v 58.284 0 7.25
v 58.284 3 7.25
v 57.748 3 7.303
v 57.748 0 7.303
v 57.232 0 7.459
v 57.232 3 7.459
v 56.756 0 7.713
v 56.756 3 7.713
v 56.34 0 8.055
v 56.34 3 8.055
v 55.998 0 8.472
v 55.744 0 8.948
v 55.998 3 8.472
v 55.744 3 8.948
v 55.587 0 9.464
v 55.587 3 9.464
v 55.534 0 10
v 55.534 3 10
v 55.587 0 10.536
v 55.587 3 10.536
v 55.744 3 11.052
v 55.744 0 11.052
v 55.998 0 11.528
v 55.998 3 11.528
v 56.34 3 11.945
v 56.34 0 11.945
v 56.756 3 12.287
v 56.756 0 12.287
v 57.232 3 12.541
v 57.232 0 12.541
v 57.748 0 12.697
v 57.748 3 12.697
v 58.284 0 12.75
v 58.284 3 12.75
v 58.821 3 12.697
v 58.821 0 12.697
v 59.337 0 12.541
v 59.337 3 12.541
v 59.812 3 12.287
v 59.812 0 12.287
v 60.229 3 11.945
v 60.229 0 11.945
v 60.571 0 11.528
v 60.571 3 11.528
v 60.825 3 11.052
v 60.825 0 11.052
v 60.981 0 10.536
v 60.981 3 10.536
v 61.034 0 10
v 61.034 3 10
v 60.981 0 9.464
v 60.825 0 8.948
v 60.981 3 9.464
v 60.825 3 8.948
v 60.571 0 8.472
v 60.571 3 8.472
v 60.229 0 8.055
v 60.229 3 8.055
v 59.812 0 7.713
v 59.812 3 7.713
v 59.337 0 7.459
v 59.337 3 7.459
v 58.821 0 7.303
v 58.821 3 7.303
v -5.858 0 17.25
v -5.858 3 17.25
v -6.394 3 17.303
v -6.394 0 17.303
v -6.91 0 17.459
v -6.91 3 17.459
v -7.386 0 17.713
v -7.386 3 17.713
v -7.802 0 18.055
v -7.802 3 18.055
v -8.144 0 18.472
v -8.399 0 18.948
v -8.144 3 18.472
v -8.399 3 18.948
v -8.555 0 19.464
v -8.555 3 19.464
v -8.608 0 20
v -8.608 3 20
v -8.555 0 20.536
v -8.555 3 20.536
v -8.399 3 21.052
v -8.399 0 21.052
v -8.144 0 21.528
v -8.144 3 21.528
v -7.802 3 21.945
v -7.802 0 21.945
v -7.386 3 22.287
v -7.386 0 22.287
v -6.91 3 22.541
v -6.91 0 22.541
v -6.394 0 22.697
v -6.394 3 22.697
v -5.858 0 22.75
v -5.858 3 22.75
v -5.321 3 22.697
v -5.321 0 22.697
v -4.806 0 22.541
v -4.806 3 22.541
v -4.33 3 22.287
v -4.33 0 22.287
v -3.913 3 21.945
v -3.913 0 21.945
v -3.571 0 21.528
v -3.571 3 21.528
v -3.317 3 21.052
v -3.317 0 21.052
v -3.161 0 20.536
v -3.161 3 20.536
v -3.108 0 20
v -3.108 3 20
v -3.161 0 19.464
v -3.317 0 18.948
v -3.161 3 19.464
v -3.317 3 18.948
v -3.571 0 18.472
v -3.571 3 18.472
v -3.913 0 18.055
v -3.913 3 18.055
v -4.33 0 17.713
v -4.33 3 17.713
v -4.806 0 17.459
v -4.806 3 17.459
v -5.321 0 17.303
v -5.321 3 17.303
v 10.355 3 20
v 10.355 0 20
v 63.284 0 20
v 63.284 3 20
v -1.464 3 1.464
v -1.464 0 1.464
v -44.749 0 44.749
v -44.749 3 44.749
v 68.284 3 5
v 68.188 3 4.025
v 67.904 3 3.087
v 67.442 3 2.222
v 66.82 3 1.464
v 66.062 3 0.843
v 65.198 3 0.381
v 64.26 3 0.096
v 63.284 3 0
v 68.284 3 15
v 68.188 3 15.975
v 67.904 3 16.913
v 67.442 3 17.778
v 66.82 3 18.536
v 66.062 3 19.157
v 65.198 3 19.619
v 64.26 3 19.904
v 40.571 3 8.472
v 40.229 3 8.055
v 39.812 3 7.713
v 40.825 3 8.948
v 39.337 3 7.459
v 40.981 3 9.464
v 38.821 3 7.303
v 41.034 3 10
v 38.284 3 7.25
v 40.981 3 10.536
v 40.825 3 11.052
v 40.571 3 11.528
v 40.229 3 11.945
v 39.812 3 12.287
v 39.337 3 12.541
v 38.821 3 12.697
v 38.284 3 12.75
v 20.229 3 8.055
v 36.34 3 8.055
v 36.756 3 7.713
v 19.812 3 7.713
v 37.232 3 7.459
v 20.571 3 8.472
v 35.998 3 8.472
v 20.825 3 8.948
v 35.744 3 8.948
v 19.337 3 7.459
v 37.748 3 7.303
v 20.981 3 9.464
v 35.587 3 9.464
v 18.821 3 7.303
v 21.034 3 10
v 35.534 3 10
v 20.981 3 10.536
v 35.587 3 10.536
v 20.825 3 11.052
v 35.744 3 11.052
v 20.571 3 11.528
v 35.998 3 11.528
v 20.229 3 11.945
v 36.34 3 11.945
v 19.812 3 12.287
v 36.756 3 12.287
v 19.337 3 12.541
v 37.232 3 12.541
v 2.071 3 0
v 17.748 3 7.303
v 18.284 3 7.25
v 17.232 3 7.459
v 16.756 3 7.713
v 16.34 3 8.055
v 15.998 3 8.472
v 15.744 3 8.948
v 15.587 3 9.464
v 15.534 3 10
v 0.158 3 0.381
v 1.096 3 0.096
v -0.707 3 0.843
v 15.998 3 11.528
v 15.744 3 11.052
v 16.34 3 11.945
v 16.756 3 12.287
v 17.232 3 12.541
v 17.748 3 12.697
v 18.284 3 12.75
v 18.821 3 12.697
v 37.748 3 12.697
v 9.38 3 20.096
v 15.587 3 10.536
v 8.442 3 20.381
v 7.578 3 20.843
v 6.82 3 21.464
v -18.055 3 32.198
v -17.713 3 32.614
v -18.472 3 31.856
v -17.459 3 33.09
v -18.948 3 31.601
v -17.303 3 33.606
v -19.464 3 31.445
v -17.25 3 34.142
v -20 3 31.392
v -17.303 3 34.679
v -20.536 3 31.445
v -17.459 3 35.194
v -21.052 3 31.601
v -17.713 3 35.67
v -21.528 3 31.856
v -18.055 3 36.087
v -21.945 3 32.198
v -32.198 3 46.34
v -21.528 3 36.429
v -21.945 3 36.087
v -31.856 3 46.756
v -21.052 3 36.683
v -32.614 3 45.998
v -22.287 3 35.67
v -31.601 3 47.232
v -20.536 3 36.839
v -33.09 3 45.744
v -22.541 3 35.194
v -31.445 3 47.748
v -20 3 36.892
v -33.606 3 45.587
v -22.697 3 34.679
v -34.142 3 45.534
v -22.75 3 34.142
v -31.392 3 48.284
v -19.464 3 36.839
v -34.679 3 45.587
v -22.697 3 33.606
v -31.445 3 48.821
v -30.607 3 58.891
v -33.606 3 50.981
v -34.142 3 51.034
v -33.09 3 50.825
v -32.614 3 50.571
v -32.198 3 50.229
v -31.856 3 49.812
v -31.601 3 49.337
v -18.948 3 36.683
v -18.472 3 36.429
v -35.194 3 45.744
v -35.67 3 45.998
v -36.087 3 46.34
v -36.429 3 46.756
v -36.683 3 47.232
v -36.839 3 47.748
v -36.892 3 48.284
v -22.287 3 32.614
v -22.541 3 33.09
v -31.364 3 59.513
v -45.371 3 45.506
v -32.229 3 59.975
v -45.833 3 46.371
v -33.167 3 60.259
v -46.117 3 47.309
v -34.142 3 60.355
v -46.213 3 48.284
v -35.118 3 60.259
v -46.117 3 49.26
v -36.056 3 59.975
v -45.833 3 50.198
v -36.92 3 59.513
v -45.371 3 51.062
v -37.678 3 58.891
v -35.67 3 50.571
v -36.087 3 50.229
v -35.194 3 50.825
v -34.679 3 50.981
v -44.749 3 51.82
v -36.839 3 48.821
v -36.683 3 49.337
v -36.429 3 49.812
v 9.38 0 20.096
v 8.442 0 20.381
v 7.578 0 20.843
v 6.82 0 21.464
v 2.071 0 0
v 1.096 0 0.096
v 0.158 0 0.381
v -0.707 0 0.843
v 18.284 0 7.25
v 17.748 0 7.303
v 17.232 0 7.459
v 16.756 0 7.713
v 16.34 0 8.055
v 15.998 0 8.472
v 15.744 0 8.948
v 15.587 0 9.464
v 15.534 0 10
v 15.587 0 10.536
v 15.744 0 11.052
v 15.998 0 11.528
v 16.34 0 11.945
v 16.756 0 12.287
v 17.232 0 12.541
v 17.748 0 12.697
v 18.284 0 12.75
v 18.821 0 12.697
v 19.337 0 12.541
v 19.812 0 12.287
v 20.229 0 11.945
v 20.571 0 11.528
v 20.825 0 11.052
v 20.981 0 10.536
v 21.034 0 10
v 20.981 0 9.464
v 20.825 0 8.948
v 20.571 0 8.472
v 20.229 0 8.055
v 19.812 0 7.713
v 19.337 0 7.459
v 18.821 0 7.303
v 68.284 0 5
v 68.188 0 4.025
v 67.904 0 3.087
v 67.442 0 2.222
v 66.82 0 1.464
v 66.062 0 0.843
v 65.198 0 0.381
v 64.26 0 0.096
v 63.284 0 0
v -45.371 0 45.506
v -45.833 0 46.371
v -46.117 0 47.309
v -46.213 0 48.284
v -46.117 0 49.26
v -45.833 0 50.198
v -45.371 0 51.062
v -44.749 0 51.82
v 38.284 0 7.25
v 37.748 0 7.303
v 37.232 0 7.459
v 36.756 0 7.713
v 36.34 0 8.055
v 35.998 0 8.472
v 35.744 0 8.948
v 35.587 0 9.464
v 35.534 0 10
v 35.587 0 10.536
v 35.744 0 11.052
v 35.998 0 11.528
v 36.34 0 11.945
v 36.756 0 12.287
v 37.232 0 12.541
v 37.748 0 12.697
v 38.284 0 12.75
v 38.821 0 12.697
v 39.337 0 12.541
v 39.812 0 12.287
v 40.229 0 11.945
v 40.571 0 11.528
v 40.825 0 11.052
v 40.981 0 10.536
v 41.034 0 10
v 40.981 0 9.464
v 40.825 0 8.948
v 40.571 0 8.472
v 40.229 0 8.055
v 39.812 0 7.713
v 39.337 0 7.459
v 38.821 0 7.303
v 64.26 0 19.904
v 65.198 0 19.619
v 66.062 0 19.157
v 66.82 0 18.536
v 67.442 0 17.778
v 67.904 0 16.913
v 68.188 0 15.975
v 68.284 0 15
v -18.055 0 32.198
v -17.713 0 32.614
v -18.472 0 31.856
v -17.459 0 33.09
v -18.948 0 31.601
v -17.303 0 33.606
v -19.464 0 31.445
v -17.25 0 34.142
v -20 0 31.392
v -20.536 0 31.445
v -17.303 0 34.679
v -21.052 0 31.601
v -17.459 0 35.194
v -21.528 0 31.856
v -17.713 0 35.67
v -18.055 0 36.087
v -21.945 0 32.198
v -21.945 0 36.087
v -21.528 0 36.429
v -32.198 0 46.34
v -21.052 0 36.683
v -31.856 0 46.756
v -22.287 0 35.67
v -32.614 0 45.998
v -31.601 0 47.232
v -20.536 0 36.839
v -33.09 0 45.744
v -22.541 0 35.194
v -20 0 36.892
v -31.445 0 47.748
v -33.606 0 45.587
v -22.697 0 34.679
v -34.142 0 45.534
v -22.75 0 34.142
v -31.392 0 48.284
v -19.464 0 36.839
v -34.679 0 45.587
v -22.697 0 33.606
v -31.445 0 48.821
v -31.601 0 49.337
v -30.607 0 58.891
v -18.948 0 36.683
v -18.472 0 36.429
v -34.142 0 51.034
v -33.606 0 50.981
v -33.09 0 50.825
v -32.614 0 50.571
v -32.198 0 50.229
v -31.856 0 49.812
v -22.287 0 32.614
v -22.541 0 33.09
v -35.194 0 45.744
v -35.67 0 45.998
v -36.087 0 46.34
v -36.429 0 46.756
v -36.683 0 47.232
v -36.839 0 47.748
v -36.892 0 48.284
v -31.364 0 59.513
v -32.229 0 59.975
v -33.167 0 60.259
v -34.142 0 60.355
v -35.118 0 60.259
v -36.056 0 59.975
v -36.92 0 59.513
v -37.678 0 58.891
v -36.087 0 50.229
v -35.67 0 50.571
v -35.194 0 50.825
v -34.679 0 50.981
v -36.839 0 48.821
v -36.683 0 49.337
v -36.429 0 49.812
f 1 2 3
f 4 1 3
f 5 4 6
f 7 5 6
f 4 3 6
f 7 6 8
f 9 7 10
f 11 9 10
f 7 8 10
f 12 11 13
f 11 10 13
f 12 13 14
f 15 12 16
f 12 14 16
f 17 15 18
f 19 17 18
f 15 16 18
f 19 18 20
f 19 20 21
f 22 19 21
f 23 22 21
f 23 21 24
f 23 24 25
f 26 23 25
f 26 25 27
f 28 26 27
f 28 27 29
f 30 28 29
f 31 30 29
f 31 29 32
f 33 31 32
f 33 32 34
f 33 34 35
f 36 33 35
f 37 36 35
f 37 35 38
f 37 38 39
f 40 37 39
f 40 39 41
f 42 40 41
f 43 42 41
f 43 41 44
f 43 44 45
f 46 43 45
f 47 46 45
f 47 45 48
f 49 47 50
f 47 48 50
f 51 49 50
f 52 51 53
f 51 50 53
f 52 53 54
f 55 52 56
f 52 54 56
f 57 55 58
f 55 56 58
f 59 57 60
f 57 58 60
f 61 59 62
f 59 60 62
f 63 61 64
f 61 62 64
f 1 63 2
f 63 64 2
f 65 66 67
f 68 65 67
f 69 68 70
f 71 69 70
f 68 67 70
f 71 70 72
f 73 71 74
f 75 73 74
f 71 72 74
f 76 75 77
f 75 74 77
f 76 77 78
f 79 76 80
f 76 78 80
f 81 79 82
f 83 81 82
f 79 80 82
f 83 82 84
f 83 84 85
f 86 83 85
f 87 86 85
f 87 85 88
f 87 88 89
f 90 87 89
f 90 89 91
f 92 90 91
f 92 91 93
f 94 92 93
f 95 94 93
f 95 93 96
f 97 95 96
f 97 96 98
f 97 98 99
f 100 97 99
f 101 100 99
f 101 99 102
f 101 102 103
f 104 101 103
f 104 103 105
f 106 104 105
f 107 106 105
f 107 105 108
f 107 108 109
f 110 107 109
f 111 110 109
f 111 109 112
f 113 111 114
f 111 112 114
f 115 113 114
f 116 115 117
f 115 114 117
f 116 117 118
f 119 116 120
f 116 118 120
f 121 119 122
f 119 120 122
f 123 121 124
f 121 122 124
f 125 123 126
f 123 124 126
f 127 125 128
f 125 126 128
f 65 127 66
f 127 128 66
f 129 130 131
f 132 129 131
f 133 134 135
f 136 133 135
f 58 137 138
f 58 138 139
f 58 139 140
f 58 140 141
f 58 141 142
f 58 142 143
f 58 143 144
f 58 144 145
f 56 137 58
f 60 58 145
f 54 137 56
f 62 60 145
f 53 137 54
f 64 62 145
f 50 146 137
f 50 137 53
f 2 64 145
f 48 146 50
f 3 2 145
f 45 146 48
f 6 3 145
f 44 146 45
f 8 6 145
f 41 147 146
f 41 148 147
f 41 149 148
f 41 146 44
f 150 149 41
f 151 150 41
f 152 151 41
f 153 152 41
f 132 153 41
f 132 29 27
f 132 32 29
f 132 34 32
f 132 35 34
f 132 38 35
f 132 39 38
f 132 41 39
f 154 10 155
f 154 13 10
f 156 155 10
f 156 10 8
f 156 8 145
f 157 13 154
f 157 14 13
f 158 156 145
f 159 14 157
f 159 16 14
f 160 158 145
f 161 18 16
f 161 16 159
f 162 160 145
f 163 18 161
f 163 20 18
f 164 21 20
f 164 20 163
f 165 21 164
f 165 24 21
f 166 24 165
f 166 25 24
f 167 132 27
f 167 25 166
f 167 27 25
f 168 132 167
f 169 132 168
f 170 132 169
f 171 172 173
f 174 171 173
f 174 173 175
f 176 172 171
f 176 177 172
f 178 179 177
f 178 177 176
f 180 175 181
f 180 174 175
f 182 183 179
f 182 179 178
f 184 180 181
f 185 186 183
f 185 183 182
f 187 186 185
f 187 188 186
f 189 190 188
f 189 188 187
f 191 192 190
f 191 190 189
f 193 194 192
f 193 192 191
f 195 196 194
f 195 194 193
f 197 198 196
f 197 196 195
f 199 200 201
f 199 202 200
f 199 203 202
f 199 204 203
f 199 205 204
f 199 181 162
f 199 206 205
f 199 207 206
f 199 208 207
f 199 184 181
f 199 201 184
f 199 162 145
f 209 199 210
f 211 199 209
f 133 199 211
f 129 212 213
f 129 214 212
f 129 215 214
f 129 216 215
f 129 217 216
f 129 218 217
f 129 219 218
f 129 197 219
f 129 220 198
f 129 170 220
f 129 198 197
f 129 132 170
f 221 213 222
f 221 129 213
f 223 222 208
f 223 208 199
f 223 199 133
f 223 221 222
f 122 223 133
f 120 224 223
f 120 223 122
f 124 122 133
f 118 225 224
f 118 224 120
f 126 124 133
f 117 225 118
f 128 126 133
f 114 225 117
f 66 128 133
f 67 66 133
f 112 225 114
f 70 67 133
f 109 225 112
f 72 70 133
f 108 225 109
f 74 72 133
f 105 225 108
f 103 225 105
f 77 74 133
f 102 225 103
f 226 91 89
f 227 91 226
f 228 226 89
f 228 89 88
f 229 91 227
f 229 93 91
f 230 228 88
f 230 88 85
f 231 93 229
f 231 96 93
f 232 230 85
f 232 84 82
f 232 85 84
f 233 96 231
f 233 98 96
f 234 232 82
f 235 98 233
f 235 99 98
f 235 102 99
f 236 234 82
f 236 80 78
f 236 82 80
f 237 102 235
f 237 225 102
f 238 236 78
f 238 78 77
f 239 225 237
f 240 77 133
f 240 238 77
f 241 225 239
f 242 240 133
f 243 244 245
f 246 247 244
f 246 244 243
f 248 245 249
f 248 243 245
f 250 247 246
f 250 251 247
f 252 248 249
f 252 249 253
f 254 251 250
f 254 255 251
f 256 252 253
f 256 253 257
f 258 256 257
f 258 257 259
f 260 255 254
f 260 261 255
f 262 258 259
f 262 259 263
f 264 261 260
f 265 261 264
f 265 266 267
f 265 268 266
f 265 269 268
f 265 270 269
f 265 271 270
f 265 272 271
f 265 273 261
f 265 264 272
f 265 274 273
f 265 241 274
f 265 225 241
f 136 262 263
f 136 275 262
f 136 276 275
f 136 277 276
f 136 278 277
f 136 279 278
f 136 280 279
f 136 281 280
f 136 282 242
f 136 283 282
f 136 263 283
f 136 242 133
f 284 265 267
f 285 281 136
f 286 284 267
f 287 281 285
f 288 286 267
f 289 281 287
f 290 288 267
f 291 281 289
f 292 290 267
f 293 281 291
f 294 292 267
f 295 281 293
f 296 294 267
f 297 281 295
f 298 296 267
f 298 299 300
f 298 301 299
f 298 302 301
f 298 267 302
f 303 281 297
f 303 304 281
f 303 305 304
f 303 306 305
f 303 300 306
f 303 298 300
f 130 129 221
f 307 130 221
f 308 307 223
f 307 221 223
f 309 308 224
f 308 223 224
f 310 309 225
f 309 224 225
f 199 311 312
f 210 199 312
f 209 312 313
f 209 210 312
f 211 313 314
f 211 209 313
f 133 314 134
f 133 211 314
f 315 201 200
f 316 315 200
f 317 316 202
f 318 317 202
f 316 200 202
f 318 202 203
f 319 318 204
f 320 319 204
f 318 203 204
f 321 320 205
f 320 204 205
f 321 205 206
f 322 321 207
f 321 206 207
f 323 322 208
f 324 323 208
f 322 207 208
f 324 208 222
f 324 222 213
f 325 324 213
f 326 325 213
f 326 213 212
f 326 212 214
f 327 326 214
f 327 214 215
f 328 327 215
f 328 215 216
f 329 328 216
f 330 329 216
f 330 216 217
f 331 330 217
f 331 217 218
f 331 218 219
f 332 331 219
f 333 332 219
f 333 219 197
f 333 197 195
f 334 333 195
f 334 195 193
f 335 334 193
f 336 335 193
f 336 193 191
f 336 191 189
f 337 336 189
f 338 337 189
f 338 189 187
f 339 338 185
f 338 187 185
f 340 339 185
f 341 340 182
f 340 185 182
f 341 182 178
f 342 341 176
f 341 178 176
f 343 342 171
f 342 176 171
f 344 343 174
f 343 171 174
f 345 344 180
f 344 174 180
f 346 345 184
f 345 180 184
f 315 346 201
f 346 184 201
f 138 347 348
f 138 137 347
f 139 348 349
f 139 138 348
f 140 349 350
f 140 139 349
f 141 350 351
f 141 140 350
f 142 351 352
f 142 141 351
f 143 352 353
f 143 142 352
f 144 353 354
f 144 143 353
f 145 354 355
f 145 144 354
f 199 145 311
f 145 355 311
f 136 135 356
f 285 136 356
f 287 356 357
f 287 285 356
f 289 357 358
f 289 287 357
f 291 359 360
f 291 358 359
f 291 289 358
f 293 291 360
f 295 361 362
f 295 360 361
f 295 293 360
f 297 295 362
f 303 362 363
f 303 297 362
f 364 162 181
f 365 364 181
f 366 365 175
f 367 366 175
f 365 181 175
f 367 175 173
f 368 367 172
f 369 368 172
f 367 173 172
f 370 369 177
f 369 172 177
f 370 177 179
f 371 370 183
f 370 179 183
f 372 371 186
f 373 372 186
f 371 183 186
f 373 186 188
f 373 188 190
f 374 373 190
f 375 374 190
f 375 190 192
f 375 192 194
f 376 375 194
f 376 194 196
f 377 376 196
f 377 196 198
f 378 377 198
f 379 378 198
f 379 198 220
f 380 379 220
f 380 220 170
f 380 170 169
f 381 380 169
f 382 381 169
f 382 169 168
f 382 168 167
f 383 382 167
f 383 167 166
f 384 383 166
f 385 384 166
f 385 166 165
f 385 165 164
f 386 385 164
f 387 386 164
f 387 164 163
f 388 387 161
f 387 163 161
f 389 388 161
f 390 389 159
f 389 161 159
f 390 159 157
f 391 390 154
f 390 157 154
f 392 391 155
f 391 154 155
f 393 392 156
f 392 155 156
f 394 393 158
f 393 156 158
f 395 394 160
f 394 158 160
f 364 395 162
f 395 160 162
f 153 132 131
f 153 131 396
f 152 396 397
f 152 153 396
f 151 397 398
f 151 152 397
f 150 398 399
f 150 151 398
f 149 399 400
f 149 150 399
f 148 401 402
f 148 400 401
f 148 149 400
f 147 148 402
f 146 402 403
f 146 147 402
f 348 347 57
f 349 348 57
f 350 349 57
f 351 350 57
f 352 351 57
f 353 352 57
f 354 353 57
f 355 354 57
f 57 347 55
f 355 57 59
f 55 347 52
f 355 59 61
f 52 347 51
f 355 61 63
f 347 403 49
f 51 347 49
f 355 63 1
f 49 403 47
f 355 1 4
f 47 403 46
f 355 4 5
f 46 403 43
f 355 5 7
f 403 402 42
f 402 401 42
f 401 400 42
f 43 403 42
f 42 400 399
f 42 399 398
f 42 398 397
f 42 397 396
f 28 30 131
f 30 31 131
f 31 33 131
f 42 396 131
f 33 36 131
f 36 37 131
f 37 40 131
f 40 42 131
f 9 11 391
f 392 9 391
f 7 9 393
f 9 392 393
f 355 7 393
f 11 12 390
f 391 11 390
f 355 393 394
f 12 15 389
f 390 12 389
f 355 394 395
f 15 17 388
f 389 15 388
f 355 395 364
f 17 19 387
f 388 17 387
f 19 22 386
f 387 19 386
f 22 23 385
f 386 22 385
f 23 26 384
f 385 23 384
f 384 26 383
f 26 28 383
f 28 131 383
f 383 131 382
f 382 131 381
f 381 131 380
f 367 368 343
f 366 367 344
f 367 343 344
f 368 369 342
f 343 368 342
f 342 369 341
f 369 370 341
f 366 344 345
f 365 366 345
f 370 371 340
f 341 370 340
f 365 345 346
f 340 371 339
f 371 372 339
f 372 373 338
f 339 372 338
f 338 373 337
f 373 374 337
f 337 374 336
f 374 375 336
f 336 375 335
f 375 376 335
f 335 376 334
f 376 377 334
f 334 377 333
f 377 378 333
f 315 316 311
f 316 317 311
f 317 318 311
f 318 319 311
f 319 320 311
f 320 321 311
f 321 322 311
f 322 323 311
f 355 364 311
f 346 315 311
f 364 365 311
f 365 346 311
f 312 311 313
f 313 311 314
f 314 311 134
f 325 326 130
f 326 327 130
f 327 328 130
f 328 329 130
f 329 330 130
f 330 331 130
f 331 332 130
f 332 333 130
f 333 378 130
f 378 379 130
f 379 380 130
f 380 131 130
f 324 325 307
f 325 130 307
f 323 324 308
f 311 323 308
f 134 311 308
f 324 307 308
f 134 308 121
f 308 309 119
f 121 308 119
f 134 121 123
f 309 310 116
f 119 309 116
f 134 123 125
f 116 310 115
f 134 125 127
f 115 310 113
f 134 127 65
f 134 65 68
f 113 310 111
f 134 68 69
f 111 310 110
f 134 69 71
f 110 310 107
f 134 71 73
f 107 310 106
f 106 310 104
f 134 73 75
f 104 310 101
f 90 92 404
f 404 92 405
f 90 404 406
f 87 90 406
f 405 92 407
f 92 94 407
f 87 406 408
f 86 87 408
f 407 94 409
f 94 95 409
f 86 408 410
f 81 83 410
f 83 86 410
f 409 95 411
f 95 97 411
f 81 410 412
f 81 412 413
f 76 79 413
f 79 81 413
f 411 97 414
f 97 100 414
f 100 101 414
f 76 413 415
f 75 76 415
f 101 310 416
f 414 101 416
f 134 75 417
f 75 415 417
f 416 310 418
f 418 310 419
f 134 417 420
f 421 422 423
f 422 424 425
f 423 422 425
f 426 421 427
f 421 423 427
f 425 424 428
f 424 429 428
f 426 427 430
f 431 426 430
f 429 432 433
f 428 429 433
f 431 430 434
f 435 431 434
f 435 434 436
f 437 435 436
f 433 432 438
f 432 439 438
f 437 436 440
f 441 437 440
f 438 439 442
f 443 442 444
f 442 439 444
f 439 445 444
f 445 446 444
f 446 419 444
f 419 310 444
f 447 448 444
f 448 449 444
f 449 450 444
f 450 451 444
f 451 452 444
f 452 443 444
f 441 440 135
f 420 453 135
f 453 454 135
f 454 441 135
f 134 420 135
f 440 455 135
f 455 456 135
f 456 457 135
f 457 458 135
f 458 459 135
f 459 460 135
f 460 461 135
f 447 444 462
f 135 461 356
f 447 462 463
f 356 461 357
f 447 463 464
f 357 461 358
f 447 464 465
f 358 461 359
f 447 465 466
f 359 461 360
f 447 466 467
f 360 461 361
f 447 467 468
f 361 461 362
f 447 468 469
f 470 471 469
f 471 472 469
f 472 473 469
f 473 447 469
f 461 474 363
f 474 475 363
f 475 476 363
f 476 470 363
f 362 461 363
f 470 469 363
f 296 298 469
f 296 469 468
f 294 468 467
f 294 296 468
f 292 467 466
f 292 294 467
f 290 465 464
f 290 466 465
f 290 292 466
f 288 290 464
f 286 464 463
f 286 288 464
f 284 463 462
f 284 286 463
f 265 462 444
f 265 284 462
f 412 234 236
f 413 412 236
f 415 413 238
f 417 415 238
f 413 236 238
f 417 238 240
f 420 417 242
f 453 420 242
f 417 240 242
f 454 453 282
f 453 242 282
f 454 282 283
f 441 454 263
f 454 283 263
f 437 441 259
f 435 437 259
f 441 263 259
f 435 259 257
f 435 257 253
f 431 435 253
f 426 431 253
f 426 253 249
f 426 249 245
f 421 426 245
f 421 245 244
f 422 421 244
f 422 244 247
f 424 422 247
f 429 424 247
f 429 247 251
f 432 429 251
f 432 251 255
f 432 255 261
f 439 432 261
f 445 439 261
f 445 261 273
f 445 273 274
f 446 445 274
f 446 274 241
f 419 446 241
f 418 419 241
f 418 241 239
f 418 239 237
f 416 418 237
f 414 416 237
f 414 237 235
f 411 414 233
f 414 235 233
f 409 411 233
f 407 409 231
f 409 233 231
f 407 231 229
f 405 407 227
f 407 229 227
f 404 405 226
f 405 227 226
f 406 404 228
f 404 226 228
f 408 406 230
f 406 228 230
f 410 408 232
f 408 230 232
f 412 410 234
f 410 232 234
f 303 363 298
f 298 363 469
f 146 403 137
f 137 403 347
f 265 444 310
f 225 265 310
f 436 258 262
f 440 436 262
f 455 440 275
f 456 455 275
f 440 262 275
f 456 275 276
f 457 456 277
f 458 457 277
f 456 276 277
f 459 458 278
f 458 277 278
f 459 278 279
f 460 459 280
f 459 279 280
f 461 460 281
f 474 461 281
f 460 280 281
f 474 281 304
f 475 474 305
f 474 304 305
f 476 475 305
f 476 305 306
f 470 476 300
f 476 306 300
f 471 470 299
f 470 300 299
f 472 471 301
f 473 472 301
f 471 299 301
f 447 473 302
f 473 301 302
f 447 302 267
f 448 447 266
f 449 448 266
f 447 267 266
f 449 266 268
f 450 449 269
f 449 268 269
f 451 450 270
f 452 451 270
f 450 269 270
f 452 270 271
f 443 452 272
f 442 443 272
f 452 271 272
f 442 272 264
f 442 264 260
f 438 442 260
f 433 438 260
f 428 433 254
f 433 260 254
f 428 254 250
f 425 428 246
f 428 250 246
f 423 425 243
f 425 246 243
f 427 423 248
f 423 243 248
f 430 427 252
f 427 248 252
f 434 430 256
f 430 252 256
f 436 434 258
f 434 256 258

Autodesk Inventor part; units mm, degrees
ref_plane "YZ Plane" through (0, 0, 0) normal (1, 0, 0) x (0, 1, 0)
ref_plane "XZ Plane" through (0, 0, 0) normal (0, 1, 0) x (-1, 0, 0)
ref_plane "XY Plane" through (0, 0, 0) normal (0, 0, 1) x (1, 0, 0)
sketch "Skizze1" plane through (0, 0, 0) normal (0, 1, 0) x (-1, 0, 0)
  line L0 (-68.2843, 0) -> (0, 0)
  line L1 (0, 0) -> (48.2843, 48.2843)
  line L2 (48.2843, 48.2843) -> (34.1421, 62.4264)
  line L3 (34.1421, 62.4264) -> (-8.2843, 20)
  line L4 (-8.2843, 20) -> (-68.2843, 20)
  line L5 (-68.2843, 20) -> (-68.2843, 0)
  line L6 (-68.2843, 10) -> (-4.1421, 10) construction
  line L7 (-4.1421, 10) -> (41.2132, 55.3553) construction
  point P0 (-58.2843, 10)
  point P1 (-38.2843, 10)
  point P2 (-18.2843, 10)
  point P3 (5.8579, 20)
  point P4 (34.1421, 48.2843)
  point P5 (20, 34.1421)
  dimension "d3" = 60
  dimension "d4" = 20
  dimension "d5" = 135
  dimension "d6" = 10
  dimension "d7" = 30
  dimension "d8" = 50
  dimension "d9" = 10
  dimension "d10" = 30
  dimension "d11" = 50
extrude "Extrusion1" add sketch "Skizze1" along normal blind 3
fillet "Rundung1" radius 5 6 edges at (-34.1421, 1.5, 62.4264) (-48.2843, 1.5, 48.2843) (8.2843, 1.5, 20) (0, 1.5, 0) (68.2843, 1.5, 20) (68.2843, 1.5, 0)
hole "Bohrung1" at (58.2843, 0, 10) at (38.2843, 0, 10) at (18.2843, 0, 10) at (-5.8579, 0, 20) at (-34.1421, 0, 48.2843) at (-20, 0, 34.1421) direction (0, 1, 0) diameter 5.5 end through all clearance for "Flachkopfsenkschraube DIN EN ISO 2009" size "M5" standard "DIN"
equation "\"d9\" = d6"
equation "\"d10\" = d7"
equation "\"d11\" = d8"
equation "\"d_tol\" = 0.3"
equation "\"d_wand\" = 1.5"
equation "\"D_oct\" = 3621.32034"
equation "\"d_traeger\" = 625"
equation "\"D_dode\" = 8196.15242"
equation "\"D_hexadeca\" = 7541.00924"
equation "\"r_rasp_pi\" = 3"
equation "\"b_rasp_pi\" = 56"
equation "\"l_rasp_pi\" = 85"
equation "\"w_kamera_vert\" = 41deg"
equation "\"w_kamera_hori\" = 66deg"
properties part number "Verbinder_45deg"
